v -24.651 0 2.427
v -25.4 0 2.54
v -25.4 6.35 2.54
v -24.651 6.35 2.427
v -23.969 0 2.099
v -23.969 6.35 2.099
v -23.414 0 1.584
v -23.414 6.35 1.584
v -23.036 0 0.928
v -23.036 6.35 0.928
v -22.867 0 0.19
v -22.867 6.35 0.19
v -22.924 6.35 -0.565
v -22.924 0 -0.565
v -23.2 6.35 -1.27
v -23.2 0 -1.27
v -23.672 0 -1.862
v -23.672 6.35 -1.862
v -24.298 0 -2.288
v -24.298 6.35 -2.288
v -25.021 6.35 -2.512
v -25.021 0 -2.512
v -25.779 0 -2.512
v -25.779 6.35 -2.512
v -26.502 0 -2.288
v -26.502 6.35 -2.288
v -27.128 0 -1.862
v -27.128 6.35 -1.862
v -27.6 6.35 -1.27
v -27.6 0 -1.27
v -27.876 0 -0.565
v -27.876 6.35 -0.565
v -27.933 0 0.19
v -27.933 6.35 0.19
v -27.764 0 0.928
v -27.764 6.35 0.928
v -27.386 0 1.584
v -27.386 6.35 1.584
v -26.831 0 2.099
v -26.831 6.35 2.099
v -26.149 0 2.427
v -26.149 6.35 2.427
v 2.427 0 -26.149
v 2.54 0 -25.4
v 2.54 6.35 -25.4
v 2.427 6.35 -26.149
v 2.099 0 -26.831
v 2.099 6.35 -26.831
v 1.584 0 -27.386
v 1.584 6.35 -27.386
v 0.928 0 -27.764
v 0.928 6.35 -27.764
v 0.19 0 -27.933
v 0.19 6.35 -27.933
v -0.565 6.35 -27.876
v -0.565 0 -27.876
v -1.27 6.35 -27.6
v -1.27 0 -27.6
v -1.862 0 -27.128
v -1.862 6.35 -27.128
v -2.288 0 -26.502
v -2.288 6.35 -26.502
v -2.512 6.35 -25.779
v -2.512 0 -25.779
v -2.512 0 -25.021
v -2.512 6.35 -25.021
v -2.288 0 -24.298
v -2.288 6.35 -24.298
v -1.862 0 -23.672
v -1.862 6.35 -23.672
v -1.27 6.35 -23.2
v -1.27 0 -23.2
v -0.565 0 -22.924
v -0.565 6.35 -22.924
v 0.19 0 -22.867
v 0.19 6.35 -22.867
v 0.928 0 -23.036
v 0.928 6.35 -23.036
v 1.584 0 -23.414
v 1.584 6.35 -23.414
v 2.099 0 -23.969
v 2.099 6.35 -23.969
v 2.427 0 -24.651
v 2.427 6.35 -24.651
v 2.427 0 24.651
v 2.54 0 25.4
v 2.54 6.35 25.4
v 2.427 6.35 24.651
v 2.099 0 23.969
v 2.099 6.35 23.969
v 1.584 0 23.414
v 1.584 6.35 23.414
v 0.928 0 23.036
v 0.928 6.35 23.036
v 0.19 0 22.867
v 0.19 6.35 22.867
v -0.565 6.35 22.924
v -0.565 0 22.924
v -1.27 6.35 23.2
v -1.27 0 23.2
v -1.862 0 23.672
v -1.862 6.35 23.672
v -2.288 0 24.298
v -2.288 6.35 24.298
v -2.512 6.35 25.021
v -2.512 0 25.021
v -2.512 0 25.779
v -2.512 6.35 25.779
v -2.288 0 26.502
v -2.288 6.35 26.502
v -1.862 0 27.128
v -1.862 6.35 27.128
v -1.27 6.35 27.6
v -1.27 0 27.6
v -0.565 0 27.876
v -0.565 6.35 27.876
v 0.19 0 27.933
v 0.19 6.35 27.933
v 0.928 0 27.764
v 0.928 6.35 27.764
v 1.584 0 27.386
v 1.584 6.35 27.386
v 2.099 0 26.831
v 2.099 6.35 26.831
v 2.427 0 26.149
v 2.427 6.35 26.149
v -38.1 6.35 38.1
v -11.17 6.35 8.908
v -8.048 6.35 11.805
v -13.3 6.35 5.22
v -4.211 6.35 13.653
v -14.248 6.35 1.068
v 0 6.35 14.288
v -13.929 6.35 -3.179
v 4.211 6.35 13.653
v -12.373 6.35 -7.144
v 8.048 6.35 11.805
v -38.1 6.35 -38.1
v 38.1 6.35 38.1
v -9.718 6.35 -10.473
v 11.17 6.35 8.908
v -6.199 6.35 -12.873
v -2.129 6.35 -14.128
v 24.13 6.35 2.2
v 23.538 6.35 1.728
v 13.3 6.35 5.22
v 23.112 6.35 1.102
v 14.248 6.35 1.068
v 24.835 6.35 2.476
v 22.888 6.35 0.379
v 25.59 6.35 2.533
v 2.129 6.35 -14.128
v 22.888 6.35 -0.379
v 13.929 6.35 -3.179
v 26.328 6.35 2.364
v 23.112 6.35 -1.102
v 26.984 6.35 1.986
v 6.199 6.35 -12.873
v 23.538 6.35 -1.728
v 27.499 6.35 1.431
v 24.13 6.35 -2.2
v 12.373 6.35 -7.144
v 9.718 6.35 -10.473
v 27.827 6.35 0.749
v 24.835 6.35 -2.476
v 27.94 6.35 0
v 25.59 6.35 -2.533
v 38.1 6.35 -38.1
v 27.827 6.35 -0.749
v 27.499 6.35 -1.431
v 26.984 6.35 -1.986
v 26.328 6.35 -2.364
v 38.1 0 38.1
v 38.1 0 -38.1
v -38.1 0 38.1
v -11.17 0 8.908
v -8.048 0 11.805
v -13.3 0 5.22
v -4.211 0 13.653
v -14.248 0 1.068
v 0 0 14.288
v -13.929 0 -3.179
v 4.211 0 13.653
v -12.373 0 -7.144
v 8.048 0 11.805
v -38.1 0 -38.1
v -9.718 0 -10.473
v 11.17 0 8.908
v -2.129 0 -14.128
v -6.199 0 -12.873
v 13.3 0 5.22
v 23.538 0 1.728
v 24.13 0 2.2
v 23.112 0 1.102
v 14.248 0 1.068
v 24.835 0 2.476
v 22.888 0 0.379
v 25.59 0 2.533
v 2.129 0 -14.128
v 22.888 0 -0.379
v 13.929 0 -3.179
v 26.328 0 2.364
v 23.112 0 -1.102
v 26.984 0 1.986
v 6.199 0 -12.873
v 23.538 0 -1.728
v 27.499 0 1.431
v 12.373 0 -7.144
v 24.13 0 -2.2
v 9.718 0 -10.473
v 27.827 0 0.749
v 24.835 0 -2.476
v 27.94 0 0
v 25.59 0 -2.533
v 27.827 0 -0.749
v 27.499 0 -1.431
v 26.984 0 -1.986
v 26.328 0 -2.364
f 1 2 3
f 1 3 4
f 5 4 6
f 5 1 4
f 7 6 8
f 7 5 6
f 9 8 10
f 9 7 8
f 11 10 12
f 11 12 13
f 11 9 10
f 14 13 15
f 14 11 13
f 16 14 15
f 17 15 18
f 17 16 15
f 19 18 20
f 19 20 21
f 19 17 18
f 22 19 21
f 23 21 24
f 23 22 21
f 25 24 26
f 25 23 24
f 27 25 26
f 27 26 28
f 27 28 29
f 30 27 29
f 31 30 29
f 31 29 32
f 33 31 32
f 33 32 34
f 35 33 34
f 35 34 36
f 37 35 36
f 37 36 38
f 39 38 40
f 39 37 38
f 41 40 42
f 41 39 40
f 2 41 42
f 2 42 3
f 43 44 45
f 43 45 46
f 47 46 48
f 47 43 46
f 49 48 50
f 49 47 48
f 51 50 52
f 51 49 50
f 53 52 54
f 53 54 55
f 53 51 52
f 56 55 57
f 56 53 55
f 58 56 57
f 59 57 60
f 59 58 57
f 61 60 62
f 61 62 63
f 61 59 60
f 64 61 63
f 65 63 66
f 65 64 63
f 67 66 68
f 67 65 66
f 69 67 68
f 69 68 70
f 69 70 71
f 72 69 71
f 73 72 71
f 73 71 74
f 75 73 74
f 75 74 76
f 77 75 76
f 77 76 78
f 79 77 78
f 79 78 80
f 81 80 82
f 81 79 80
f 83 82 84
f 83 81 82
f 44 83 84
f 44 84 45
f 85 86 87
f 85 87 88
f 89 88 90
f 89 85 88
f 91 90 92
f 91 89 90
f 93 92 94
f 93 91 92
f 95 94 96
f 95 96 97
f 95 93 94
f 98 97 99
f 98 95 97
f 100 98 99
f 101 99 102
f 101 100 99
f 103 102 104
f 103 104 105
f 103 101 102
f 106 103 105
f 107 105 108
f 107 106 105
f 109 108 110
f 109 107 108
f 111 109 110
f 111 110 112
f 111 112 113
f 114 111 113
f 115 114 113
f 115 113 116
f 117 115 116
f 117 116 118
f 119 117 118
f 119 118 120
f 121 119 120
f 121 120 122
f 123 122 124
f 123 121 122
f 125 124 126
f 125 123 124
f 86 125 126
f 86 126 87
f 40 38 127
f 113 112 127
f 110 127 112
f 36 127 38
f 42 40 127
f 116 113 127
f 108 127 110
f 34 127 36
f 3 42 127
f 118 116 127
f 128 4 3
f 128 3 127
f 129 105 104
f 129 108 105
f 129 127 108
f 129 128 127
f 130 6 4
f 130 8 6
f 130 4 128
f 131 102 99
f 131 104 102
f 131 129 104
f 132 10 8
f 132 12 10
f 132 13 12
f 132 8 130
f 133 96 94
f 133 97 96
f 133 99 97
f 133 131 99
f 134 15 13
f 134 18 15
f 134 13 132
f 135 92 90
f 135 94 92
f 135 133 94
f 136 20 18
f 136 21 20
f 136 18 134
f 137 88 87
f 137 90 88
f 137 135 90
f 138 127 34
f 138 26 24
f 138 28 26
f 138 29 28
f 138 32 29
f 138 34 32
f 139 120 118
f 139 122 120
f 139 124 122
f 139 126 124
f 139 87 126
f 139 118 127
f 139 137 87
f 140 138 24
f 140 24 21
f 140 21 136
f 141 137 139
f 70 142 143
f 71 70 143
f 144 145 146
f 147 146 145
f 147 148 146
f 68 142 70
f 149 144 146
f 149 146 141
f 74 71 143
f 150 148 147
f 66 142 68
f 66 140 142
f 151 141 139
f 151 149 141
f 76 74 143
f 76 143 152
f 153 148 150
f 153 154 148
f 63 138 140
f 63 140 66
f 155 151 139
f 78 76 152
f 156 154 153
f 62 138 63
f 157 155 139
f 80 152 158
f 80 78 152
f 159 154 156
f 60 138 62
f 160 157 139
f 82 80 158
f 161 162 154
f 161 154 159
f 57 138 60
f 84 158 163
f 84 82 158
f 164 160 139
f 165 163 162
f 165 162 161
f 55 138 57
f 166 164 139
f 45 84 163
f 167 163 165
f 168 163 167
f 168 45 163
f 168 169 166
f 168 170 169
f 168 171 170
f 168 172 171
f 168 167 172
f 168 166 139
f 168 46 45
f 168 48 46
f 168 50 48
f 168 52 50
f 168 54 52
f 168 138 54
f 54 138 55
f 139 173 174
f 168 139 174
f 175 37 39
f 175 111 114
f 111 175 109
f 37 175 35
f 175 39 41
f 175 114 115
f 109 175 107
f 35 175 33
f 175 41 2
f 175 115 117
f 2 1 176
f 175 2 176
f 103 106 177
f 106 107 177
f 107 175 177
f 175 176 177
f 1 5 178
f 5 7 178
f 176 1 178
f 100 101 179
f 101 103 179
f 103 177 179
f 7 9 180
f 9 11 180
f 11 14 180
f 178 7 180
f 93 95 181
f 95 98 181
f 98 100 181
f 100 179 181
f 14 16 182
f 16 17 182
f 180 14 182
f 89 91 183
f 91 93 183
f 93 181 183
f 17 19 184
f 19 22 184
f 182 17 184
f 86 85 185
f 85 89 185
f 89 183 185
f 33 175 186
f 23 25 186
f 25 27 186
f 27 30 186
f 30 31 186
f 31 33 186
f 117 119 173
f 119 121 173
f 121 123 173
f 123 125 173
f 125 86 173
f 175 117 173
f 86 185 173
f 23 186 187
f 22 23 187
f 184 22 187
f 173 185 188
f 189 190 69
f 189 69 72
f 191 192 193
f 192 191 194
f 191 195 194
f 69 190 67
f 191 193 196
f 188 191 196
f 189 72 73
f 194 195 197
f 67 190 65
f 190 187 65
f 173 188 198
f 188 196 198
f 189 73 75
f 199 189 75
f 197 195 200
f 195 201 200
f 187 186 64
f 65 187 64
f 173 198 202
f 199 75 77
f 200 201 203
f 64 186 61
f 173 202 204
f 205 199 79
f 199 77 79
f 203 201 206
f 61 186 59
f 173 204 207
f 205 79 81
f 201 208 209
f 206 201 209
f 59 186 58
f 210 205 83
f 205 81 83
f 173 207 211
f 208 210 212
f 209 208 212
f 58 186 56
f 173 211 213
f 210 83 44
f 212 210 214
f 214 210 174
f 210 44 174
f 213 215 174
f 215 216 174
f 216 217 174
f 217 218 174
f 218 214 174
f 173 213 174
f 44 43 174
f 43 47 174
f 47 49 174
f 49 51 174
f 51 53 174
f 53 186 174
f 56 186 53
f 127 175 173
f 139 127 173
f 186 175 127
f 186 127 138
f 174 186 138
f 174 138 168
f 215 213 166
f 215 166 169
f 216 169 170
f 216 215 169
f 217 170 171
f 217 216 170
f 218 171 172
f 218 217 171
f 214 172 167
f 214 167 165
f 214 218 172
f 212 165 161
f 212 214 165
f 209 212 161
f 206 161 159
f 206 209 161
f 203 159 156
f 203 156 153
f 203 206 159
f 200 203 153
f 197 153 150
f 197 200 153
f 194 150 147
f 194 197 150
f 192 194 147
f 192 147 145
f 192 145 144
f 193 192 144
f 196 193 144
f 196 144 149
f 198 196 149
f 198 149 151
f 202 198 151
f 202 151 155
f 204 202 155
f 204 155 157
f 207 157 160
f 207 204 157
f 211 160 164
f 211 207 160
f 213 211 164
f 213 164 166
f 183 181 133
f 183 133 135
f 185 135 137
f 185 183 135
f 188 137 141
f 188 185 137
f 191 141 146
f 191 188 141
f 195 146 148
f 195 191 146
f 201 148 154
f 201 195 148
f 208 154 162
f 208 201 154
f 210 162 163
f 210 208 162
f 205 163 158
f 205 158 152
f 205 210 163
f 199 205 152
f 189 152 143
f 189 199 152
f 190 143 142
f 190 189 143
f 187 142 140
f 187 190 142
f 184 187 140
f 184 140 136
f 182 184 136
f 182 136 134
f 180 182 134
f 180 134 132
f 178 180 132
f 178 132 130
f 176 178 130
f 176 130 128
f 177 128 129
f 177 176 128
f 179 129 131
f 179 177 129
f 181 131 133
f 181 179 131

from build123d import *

# Parameters (mm, degrees)
SKETCH1_W                  = 76.2
SKETCH1_H                  = 76.2
SKETCH1_R                  = 14.2875
SKETCH1_R_2                = 2.54
INITIAL_PLATE_DEPTH        = 6.35
MOUNTING_PATTERN_OUTLINE_R = 2.54
MOUNTING_PATTERN_DEPTH     = 6.35


# Read off the part's stored shape, not the designer's step: Mounting Pattern
with BuildPart() as part:
    # Sketch1 → Initial Plate (new body)
    with BuildSketch(Plane(origin=(0, 0, 0), x_dir=(1, 0, 0), z_dir=(0, 1, 0))):
        Rectangle(SKETCH1_W, SKETCH1_H)
        with Locations(Location((0, 0, 0), (0, 0, 270))):
            Circle(SKETCH1_R, mode=Mode.SUBTRACT)
        with Locations(Location((-25.4, 0, 0), (0, 0, 270))):
            Circle(SKETCH1_R_2, mode=Mode.SUBTRACT)
    extrude(amount=INITIAL_PLATE_DEPTH)

    # Mounting Pattern outline → Mounting Pattern (cut)
    with BuildSketch(Plane(origin=(0, 0, 0), x_dir=(1, 0, 0), z_dir=(0, 1, 0))):
        with Locations((0, 25.4)):
            Circle(MOUNTING_PATTERN_OUTLINE_R)
        with Locations((25.4, 0)):
            Circle(MOUNTING_PATTERN_OUTLINE_R)
        with Locations((0, -25.4)):
            Circle(MOUNTING_PATTERN_OUTLINE_R)
    extrude(amount=MOUNTING_PATTERN_DEPTH, mode=Mode.SUBTRACT)


solid = part.part
